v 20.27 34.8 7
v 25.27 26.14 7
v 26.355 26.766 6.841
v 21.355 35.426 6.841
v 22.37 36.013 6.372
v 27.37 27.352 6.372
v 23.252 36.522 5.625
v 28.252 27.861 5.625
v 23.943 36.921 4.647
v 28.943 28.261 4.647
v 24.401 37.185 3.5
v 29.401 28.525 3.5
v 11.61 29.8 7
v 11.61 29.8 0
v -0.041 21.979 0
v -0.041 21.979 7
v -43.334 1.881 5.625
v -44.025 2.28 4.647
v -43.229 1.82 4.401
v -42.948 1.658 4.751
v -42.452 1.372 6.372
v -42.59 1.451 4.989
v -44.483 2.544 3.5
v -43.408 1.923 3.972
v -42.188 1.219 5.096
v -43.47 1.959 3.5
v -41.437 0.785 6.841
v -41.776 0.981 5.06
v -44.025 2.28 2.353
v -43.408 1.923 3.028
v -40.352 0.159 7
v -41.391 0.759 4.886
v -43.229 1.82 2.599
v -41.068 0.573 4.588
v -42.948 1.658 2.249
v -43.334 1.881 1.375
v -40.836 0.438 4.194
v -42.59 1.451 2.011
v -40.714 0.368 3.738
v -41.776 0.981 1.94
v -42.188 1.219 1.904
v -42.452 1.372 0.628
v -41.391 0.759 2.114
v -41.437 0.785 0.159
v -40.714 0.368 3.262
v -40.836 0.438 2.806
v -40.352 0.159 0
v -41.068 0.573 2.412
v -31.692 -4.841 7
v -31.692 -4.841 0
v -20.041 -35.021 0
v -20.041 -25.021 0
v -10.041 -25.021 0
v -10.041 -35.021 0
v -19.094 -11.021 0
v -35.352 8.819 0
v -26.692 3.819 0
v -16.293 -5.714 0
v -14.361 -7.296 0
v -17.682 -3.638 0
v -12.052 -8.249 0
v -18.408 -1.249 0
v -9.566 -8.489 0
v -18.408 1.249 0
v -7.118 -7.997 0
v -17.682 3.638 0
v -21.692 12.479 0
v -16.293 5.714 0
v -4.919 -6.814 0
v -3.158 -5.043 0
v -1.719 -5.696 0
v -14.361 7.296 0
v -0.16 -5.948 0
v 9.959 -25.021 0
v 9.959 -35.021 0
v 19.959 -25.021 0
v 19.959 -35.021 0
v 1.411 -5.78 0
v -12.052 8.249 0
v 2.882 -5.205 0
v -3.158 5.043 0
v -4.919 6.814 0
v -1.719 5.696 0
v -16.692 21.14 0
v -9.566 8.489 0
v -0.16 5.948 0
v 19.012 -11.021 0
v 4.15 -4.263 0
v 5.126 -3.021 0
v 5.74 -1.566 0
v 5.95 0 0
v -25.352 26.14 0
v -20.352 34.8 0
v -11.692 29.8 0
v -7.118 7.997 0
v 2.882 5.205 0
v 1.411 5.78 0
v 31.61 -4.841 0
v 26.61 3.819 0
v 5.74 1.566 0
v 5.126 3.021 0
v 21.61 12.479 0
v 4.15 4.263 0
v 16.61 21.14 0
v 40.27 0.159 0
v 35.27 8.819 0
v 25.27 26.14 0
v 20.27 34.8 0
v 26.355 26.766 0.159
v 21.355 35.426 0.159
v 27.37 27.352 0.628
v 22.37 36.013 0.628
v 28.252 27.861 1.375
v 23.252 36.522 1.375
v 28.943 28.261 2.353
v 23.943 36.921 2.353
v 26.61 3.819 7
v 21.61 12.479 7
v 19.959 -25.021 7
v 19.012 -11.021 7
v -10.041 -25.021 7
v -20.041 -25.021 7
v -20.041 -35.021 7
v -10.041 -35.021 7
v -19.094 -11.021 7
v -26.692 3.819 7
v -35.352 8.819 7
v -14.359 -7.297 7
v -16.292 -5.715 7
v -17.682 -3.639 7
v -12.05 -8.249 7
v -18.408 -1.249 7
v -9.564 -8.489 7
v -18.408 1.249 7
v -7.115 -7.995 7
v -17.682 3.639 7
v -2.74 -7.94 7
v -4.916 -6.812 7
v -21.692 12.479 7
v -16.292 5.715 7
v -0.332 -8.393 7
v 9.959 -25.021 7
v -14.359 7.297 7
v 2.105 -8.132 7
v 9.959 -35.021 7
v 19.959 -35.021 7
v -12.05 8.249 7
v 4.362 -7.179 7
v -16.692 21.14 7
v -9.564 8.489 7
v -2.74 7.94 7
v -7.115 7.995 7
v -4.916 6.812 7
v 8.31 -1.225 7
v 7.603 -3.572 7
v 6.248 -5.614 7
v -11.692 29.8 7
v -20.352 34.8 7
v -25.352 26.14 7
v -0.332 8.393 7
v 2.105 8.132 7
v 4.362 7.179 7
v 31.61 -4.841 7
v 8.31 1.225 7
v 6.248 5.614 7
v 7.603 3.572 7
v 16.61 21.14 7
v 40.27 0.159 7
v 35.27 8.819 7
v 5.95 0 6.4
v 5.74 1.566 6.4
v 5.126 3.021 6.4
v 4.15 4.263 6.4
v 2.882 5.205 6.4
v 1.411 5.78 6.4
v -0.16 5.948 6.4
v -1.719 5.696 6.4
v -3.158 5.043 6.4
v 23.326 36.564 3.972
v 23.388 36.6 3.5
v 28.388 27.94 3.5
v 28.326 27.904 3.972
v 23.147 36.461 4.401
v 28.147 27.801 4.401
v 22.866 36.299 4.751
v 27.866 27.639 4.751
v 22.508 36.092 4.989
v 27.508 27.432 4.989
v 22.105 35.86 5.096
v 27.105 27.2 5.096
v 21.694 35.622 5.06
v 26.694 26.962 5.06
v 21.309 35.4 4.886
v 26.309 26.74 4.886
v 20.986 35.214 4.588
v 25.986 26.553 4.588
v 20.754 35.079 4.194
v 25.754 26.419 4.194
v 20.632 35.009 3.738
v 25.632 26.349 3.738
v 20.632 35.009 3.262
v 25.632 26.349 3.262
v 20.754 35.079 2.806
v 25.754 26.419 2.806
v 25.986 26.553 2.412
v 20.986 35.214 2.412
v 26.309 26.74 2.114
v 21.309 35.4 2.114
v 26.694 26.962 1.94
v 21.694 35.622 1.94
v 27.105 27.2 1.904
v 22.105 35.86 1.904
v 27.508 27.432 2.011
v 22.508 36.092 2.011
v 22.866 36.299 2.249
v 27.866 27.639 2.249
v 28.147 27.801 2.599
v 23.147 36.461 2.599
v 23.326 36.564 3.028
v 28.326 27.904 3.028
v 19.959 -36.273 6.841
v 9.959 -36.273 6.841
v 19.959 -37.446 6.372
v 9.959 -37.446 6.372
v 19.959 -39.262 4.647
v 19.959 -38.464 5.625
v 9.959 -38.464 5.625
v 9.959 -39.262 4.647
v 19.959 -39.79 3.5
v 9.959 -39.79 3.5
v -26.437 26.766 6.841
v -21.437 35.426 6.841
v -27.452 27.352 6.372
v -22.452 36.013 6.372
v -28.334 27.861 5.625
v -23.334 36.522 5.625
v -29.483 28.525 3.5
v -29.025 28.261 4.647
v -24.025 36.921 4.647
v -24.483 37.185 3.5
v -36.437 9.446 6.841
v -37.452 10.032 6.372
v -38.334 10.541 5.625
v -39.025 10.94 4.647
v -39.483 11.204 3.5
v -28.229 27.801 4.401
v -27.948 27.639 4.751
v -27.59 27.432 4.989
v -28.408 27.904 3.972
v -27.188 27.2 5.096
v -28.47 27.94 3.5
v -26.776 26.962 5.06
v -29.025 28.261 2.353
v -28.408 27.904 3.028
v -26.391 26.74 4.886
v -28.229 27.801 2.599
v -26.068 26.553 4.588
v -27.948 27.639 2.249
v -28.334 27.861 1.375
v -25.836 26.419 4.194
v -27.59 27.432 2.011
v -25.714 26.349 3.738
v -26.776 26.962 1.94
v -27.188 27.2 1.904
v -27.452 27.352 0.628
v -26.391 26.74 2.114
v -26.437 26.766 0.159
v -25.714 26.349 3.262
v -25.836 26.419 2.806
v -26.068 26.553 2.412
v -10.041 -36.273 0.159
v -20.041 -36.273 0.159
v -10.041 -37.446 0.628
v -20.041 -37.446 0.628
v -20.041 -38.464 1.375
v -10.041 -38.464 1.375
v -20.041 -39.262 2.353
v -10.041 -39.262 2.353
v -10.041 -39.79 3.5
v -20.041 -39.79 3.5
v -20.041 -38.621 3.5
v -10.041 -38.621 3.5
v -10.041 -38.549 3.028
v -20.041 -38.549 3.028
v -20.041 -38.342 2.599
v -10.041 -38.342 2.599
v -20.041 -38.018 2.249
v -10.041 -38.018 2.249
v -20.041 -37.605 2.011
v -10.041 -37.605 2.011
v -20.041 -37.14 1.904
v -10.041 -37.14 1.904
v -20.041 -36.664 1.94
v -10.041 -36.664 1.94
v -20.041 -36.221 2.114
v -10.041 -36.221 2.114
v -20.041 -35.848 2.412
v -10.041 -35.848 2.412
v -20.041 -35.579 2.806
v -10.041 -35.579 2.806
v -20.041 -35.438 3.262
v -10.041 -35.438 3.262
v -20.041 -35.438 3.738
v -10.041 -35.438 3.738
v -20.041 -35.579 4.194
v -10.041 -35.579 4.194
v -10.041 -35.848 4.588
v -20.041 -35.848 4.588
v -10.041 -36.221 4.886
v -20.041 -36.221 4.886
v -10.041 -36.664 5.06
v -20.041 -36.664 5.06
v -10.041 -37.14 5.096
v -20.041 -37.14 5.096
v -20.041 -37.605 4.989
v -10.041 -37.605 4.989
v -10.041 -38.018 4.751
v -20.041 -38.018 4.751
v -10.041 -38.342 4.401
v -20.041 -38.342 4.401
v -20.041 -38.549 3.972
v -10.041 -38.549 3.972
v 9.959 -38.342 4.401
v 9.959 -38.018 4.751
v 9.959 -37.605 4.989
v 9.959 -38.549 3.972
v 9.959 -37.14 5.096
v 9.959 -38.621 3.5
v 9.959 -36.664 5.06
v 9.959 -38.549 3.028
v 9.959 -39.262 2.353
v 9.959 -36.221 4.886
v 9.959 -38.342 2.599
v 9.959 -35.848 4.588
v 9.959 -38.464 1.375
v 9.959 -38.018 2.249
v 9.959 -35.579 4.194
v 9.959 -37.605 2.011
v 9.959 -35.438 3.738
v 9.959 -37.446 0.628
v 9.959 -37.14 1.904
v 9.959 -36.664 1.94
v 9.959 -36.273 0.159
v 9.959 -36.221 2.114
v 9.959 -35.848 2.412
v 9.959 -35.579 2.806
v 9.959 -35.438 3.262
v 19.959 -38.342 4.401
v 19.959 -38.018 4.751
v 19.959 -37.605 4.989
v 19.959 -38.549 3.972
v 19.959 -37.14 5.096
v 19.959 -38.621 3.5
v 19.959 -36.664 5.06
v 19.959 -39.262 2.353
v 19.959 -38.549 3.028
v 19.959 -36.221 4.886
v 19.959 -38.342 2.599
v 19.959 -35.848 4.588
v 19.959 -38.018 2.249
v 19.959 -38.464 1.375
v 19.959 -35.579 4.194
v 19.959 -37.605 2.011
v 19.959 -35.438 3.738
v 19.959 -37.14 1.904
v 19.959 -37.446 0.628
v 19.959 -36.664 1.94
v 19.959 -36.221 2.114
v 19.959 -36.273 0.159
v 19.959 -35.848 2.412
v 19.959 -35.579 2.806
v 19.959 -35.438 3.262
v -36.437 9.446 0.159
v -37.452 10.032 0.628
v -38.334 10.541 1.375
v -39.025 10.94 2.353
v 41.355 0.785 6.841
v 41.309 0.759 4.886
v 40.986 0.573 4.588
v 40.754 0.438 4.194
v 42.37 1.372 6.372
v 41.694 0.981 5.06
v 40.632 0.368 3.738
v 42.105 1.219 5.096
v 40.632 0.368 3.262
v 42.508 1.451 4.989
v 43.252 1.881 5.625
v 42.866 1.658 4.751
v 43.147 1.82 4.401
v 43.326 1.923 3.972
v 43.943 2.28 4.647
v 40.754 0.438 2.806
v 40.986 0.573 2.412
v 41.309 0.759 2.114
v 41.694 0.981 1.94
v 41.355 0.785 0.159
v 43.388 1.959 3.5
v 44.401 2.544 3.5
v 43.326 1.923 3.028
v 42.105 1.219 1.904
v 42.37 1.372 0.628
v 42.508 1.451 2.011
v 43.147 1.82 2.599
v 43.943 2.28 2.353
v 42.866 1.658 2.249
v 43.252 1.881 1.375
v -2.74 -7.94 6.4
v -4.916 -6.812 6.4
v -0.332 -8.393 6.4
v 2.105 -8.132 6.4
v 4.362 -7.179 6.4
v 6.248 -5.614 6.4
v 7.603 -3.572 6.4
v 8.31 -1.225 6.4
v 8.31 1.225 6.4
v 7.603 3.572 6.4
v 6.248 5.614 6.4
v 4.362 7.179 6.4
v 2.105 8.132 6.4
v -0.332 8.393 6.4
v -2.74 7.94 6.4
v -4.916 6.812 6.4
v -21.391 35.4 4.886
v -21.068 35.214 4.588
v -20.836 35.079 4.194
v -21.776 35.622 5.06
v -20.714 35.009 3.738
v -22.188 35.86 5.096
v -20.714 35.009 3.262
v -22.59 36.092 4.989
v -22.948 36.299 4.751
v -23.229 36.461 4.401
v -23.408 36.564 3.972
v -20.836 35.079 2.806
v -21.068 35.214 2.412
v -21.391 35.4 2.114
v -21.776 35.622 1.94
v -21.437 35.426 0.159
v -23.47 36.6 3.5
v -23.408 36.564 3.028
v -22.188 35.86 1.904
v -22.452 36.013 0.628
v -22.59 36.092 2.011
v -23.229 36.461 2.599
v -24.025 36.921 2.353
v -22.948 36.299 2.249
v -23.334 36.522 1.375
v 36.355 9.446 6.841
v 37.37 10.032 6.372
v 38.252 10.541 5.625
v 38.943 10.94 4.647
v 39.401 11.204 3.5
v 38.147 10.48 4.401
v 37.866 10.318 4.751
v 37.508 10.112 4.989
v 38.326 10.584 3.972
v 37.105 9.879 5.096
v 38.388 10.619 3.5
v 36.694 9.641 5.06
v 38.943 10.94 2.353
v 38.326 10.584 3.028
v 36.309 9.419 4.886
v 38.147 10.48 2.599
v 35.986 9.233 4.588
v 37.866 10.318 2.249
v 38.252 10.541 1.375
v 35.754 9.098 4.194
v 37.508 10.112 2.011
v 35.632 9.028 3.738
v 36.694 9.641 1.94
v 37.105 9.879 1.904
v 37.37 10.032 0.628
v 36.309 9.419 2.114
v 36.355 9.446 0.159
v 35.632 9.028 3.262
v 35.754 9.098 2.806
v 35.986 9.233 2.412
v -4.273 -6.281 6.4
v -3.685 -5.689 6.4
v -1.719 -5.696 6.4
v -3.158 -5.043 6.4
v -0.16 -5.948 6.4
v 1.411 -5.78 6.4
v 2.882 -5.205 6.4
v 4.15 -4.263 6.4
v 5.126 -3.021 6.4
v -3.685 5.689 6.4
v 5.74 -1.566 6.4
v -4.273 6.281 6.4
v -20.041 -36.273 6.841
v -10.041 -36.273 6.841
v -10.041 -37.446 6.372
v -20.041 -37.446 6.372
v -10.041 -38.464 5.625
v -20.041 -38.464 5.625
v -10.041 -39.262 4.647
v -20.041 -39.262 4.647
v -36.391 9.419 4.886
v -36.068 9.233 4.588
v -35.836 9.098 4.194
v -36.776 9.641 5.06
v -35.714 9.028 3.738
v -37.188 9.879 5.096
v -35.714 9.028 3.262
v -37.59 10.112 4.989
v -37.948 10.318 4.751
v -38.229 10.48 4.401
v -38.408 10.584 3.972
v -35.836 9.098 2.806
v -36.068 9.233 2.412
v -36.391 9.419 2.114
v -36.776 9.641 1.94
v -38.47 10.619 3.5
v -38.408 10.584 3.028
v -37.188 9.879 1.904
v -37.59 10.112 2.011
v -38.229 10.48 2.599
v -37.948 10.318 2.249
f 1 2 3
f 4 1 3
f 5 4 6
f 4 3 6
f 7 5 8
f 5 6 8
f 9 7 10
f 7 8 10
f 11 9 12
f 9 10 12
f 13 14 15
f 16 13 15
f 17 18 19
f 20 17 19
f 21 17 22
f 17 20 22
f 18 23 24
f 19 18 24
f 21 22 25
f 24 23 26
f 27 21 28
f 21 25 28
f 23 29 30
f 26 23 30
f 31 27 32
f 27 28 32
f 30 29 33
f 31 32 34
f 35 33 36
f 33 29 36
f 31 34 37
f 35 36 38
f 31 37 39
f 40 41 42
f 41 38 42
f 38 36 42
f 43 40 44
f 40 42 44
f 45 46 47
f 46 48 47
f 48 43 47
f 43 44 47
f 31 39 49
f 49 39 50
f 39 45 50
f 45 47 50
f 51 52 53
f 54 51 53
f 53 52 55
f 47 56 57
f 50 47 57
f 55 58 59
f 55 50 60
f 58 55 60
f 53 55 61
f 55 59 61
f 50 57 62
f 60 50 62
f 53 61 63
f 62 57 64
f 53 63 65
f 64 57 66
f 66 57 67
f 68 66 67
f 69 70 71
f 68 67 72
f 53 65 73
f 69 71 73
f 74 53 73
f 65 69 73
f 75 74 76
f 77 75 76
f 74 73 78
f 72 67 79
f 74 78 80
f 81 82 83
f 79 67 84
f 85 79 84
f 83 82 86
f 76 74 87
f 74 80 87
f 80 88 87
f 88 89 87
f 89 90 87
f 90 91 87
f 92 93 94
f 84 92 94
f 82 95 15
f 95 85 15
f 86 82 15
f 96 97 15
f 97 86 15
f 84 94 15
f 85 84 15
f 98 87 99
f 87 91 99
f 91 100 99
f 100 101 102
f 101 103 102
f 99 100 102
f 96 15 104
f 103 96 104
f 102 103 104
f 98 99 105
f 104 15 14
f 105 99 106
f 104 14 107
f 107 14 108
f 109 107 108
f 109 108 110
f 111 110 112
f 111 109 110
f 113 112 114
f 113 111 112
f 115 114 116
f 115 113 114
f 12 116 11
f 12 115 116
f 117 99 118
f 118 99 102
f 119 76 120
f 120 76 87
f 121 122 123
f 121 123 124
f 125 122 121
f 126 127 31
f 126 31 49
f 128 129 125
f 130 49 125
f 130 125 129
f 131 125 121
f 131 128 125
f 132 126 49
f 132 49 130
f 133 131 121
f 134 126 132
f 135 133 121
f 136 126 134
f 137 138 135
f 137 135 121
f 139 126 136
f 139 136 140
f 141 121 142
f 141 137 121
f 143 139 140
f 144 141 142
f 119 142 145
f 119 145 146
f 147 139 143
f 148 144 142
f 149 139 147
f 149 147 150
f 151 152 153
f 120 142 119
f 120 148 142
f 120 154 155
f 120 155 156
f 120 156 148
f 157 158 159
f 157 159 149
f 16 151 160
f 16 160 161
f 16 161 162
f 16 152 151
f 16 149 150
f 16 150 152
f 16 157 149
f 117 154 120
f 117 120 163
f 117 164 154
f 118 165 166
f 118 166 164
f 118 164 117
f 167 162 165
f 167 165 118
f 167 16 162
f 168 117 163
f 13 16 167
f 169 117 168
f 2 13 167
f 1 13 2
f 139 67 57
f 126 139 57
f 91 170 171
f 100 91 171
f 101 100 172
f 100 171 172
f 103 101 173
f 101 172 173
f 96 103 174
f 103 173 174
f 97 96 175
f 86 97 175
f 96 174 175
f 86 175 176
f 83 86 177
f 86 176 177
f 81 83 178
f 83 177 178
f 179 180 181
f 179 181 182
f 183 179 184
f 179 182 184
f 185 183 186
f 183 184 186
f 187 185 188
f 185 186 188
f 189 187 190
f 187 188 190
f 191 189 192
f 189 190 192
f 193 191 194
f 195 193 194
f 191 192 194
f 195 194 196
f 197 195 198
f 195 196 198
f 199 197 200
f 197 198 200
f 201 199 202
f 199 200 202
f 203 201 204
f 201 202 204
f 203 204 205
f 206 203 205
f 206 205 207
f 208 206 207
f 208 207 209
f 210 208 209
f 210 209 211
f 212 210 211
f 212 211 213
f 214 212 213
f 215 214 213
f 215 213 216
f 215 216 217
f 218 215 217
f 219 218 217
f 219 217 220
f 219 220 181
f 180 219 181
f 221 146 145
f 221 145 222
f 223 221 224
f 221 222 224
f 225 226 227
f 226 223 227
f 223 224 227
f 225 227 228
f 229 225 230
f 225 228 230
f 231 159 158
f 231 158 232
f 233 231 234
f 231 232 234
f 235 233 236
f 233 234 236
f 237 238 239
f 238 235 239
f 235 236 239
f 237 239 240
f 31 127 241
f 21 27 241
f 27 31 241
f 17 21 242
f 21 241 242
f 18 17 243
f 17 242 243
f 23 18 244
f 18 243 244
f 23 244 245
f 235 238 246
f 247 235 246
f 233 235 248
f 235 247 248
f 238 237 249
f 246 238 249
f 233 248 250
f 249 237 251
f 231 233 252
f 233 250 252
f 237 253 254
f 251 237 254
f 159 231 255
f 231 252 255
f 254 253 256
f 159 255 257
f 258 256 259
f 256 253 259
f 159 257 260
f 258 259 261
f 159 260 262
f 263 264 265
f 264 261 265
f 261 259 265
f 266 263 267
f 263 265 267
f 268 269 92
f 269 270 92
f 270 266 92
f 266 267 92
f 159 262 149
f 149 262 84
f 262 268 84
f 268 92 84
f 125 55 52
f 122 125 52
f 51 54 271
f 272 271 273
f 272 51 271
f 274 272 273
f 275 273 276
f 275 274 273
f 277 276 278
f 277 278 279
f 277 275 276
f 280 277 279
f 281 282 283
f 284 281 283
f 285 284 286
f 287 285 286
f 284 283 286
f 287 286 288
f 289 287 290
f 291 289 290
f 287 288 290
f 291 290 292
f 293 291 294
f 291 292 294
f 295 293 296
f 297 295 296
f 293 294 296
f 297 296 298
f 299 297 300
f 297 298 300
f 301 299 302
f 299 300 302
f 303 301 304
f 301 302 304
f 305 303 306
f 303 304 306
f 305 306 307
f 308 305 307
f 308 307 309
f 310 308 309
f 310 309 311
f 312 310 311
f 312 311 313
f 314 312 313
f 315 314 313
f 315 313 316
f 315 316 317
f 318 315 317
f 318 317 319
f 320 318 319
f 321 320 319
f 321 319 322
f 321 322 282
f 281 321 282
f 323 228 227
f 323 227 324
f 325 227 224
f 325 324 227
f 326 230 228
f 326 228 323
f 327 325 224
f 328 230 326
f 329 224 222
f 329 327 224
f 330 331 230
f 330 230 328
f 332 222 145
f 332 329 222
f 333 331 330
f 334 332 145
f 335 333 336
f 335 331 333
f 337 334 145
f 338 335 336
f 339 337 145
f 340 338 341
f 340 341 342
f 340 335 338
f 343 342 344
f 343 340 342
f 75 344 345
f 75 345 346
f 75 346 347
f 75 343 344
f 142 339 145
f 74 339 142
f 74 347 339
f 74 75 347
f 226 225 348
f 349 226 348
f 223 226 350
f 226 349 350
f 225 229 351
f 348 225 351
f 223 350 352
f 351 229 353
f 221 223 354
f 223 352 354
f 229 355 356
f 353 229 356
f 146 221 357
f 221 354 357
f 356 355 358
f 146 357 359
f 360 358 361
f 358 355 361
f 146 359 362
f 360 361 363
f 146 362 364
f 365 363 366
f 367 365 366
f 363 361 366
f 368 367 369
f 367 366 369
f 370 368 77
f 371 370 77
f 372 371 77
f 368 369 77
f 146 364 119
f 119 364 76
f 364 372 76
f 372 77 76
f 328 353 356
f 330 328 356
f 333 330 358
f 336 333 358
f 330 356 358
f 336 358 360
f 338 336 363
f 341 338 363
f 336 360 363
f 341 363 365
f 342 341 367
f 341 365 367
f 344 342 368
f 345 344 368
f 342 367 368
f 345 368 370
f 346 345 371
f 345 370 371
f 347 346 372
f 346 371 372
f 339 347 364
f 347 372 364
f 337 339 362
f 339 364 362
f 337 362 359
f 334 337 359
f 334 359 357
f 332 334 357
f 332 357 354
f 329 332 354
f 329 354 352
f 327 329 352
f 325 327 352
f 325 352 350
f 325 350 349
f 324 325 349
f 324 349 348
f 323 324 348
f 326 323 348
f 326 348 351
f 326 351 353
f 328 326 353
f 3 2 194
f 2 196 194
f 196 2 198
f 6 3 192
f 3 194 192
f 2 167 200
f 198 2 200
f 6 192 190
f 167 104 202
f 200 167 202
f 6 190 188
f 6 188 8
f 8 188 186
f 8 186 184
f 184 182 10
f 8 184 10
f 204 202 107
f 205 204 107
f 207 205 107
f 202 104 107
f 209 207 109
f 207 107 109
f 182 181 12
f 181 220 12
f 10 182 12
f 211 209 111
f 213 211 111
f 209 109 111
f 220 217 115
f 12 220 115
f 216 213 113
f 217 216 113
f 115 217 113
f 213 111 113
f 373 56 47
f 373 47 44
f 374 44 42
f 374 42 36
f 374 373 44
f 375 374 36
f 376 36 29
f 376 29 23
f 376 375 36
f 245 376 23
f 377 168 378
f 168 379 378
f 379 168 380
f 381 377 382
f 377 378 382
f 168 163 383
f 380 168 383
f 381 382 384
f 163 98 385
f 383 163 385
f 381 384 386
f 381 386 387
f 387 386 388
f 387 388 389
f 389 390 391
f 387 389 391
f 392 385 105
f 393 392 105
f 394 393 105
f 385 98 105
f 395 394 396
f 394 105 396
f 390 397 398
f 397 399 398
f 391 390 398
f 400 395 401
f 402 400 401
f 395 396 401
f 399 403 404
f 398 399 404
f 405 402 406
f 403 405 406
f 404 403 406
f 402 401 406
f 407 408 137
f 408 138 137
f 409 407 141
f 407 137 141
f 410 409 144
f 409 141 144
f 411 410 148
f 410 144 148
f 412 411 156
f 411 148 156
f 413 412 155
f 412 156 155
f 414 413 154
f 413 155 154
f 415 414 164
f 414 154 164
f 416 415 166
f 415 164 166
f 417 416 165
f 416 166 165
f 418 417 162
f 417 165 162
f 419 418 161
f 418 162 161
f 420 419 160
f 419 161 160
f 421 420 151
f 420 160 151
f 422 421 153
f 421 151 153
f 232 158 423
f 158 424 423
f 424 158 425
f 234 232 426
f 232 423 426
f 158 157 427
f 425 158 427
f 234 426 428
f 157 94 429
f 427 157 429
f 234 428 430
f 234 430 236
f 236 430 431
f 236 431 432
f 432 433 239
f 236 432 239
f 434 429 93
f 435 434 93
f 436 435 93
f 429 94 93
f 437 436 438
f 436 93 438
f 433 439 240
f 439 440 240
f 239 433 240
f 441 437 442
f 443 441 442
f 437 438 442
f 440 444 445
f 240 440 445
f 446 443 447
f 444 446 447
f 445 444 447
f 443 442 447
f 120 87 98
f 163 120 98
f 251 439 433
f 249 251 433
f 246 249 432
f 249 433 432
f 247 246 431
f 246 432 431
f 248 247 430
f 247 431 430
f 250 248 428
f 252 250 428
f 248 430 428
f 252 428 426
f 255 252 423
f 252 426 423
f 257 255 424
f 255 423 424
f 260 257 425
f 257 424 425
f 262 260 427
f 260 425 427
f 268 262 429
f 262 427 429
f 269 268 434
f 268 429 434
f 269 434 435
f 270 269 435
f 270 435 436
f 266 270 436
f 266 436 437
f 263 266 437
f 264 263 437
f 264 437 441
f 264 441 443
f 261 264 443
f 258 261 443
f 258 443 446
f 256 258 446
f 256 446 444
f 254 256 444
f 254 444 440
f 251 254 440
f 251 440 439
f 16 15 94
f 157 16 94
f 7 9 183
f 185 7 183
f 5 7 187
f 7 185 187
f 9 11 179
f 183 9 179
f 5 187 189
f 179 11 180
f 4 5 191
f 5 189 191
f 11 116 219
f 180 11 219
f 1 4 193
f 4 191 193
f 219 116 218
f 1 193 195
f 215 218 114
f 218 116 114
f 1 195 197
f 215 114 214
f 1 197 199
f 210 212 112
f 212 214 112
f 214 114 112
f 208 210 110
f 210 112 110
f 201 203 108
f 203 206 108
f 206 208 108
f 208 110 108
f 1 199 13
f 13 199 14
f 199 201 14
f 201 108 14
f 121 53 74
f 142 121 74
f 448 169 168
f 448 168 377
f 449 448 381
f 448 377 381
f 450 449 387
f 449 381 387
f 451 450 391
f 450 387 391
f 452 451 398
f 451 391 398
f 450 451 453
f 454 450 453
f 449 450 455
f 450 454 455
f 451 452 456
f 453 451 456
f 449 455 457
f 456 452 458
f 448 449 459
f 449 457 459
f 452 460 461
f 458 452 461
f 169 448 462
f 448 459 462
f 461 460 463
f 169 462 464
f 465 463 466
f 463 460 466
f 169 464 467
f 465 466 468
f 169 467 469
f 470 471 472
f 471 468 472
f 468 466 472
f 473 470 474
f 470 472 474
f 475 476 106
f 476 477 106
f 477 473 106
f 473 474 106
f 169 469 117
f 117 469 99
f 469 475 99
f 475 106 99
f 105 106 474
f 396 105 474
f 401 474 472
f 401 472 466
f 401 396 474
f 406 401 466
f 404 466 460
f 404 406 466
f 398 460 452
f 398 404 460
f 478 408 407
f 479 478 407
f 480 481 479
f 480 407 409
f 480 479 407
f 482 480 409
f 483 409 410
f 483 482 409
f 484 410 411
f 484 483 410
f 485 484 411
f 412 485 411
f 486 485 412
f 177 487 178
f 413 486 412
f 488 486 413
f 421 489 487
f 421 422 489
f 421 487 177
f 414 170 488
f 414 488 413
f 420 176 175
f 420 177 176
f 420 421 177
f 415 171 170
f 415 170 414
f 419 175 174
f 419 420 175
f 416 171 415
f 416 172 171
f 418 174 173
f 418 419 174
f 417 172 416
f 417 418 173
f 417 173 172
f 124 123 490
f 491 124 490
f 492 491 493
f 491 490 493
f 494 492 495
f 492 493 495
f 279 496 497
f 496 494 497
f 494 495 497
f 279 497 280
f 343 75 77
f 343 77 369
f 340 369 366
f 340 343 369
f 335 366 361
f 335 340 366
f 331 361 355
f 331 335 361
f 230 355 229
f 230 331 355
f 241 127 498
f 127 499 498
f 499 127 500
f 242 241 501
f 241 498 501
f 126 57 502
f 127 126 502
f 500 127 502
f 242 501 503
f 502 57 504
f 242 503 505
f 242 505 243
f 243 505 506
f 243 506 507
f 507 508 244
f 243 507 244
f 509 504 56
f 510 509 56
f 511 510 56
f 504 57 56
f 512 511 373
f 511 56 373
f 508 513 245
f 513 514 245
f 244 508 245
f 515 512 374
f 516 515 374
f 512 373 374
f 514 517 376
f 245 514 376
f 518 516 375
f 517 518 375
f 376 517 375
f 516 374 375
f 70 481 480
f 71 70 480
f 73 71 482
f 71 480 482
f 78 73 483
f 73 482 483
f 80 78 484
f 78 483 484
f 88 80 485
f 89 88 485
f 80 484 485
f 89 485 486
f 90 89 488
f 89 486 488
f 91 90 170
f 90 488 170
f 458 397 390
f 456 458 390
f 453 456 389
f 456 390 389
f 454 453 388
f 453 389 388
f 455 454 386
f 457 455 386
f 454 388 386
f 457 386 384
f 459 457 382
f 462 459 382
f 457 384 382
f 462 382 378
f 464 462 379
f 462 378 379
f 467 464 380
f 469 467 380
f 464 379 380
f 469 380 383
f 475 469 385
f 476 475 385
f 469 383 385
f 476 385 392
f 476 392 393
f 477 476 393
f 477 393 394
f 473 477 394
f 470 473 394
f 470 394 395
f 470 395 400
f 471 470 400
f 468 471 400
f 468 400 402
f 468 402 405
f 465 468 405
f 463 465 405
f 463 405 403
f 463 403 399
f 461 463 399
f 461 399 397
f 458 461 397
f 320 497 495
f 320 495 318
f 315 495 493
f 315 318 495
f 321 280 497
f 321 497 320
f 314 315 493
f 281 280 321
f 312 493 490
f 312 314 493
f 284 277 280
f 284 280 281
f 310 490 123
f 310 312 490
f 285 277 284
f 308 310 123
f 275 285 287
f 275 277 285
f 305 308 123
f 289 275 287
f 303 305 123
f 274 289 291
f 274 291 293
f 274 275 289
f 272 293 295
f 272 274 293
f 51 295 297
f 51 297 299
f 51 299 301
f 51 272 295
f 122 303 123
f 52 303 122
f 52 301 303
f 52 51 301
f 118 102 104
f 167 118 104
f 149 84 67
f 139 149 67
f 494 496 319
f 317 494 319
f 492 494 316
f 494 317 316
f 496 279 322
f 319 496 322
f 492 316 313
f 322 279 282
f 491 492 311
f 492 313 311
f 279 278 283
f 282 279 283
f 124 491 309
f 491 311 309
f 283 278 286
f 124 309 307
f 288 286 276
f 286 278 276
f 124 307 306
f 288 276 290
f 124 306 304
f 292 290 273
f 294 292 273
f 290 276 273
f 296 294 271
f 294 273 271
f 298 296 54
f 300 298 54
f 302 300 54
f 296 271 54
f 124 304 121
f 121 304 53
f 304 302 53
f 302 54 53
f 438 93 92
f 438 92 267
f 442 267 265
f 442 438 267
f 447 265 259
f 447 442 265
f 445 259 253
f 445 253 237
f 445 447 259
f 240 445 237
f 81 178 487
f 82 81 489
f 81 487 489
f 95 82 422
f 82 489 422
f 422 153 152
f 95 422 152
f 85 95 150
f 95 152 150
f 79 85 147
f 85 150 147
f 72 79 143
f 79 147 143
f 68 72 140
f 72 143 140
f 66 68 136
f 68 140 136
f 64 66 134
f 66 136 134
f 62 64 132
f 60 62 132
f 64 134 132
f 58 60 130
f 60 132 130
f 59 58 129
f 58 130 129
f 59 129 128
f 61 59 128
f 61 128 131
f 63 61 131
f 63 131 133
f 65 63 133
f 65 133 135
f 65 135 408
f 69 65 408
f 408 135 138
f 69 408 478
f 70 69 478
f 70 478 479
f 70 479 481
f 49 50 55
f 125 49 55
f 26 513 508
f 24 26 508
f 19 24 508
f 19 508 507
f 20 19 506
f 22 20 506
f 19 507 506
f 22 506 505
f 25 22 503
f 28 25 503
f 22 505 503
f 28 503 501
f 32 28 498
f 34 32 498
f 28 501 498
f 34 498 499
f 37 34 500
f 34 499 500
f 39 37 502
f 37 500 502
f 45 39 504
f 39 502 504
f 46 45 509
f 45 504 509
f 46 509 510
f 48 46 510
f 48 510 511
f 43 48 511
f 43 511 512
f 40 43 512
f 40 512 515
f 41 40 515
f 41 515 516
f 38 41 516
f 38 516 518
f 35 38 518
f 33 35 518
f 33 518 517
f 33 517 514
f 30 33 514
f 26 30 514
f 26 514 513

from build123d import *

# Parameters (mm, degrees)
F0_W         = 10
F0_H         = 15
F1_DEPTH     = 7
F3_DEPTH     = 60
F4_R         = 1.6
F5_DEPTH     = 60
F6_R         = 1.6
F7_DEPTH     = 60
F8_T1_DEPTH  = 35
F8_T3_DEPTH  = 35
F8_T5_DEPTH  = 35
F8_T7_DEPTH  = 35
F8_T9_DEPTH  = 35
F8_T11_DEPTH = 35
F11_DEPTH    = 25
F12_R        = 8.4
F13_DEPTH    = 0.6


# Not quite as in the source:
# - a fillet or chamfer that OpenCascade refuses, or shapes differently, is made with other operations: its cross-section is extruded or revolved along the edge and cut away or added
# - a feature names something its author has since deleted; it is built from what else it names


with BuildPart() as f1:
    # F0 (on Top) → F1 (new body)
    with BuildSketch(Plane.XY):
        Polygon((-19.0935776077, -11.020506829), (-0.0410187244, -0.020506829), (-21.6916538191, 12.479493171), (-26.6916538191, 3.8192391331), (-31.6916538191, -4.8410149047), align=None)
        Polygon((-0.0410187244, 21.979493171), (-0.0410187244, -0.020506829), (21.6096163702, 12.479493171), (16.6096163702, 21.1397472088), (11.6096163702, 29.8000012467), align=None)
        Polygon((19.0115401588, -11.020506829), (-0.0410187244, -0.020506829), (-0.0410187244, -25.020506829), (9.9589812756, -25.020506829), (19.9589812756, -25.020506829), align=None)
        Polygon((-0.0410187244, -25.020506829), (-0.0410187244, -0.020506829), (-19.0935776077, -11.020506829), (-20.0410187244, -25.020506829), (-10.0410187244, -25.020506829), align=None)
        Polygon((-21.6916538191, 12.479493171), (-0.0410187244, -0.020506829), (-0.0410187244, 21.979493171), (-11.6916538191, 29.8000012467), (-16.6916538191, 21.1397472088), align=None)
        Polygon((21.6096163702, 12.479493171), (-0.0410187244, -0.020506829), (19.0115401588, -11.020506829), (31.6096163702, -4.8410149047), (26.6096163702, 3.8192391331), align=None)
        Polygon((-29.6820348758, 28.6397472088), (-16.6916538191, 21.1397472088), (-11.6916538191, 29.8000012467), (-24.6820348758, 37.3000012467), align=None)
        Polygon((-31.6916538191, -4.8410149047), (-26.6916538191, 3.8192391331), (-39.6820348758, 11.3192391331), (-44.6820348758, 2.6589850953), align=None)
        Polygon((39.5999974269, 11.3192391331), (26.6096163702, 3.8192391331), (31.6096163702, -4.8410149047), (44.5999974269, 2.6589850953), align=None)
        Polygon((11.6096163702, 29.8000012467), (16.6096163702, 21.1397472088), (29.5999974269, 28.6397472088), (24.5999974269, 37.3000012467), align=None)
        with Locations((-15.0410187244, -32.520506829)):
            Rectangle(F0_W, F0_H)
        with Locations((14.9589812756, -32.520506829)):
            Rectangle(F0_W, F0_H)
    extrude(amount=F1_DEPTH)

    # F2 (on face) → F3 (cut)
    with BuildSketch(Plane.YZ.offset(19.9589812756)):
        with BuildLine():
            ThreePointArc((-35.420506829, 3.5), (-37.020506829, 5.1), (-38.620506829, 3.5))
            ThreePointArc((-38.620506829, 3.5), (-37.020506829, 1.9), (-35.420506829, 3.5))
        make_face()
    extrude(amount=-F3_DEPTH, mode=Mode.SUBTRACT)

    # F4 (on face) → F5 (cut)
    with BuildSketch(Plane(origin=(9.9986250363, -17.3181265688, 0), x_dir=(0.8660254038, 0.5, 0), z_dir=(0.5, -0.8660254038, 0))):
        with Locations((36.9542233281, 3.5)):
            Circle(F4_R)
    extrude(amount=-F5_DEPTH, mode=Mode.SUBTRACT)

    # F6 (on face) → F7 (cut)
    with BuildSketch(Plane(origin=(9.9808656014, 17.2873663252, 0), x_dir=(-0.8660254038, 0.5, 0), z_dir=(0.5, 0.8660254038, 0))):
        with Locations((37.0252698429, 3.5)):
            Circle(F6_R)
    extrude(amount=-F7_DEPTH, mode=Mode.SUBTRACT)

    # F8: fillet of radius 5 on 12 edges, made by hand

    # F8_s2 → F8_t1 (cut)
    with BuildSketch(Plane.YZ.offset(-32.5410187244)):
        with BuildLine():
            ThreePointArc((-35.020506829, 7), (-38.556040735, 5.5355339059), (-40.020506829, 2))
            Line((-40.020506829, 2), (-40.020506829, 7))
            Line((-40.020506829, 7), (-35.020506829, 7))
        make_face()
        with BuildLine():
            ThreePointArc((-35.020506829, 0), (-38.556040735, 1.4644660941), (-40.020506829, 5))
            Line((-40.020506829, 5), (-40.020506829, 0))
            Line((-40.020506829, 0), (-35.020506829, 0))
        make_face()
    extrude(amount=F8_T1_DEPTH, mode=Mode.SUBTRACT)

    # F8_s4 → F8_t3 (cut)
    with BuildSketch(Plane.YZ.offset(-2.5410187244)):
        with BuildLine():
            ThreePointArc((-35.020506829, 0), (-38.556040735, 1.4644660941), (-40.020506829, 5))
            Line((-40.020506829, 5), (-40.020506829, 0))
            Line((-40.020506829, 0), (-35.020506829, 0))
        make_face()
        with BuildLine():
            ThreePointArc((-35.020506829, 7), (-38.556040735, 5.5355339059), (-40.020506829, 2))
            Line((-40.020506829, 2), (-40.020506829, 7))
            Line((-40.020506829, 7), (-35.020506829, 7))
        make_face()
    extrude(amount=F8_T3_DEPTH, mode=Mode.SUBTRACT)

    # F8_s6 → F8_t5 (cut)
    with BuildSketch(Plane(origin=(16.2486250363, -28.1434441161, 0), x_dir=(0, 0, 1), z_dir=(-0.5, 0.8660254038, 0))):
        with BuildLine():
            ThreePointArc((7, 34.9542233281), (5.5355339059, 38.489757234), (2, 39.9542233281))
            Line((2, 39.9542233281), (7, 39.9542233281))
            Line((7, 39.9542233281), (7, 34.9542233281))
        make_face()
        with BuildLine():
            ThreePointArc((0, 34.9542233281), (1.4644660941, 38.489757234), (5, 39.9542233281))
            Line((5, 39.9542233281), (0, 39.9542233281))
            Line((0, 39.9542233281), (0, 34.9542233281))
        make_face()
    extrude(amount=F8_T5_DEPTH, mode=Mode.SUBTRACT)

    # F8_s8 → F8_t7 (cut)
    with BuildSketch(Plane(origin=(1.2486250363, -2.1626820025, 0), x_dir=(0, 0, 1), z_dir=(-0.5, 0.8660254038, 0))):
        with BuildLine():
            ThreePointArc((7, 34.9542233281), (5.5355339059, 38.489757234), (2, 39.9542233281))
            Line((2, 39.9542233281), (7, 39.9542233281))
            Line((7, 39.9542233281), (7, 34.9542233281))
        make_face()
        with BuildLine():
            ThreePointArc((0, 34.9542233281), (1.4644660941, 38.489757234), (5, 39.9542233281))
            Line((5, 39.9542233281), (0, 39.9542233281))
            Line((0, 39.9542233281), (0, 34.9542233281))
        make_face()
    extrude(amount=F8_T7_DEPTH, mode=Mode.SUBTRACT)

    # F8_s10 → F8_t9 (cut)
    with BuildSketch(Plane(origin=(16.2308656014, 28.1126838725, 0), x_dir=(0, 0, 1), z_dir=(-0.5, -0.8660254038, 0))):
        with BuildLine():
            ThreePointArc((7, 35.0252698429), (5.5355339059, 38.5608037488), (2, 40.0252698429))
            Line((2, 40.0252698429), (7, 40.0252698429))
            Line((7, 40.0252698429), (7, 35.0252698429))
        make_face()
        with BuildLine():
            ThreePointArc((0, 35.0252698429), (1.4644660941, 38.5608037488), (5, 40.0252698429))
            Line((5, 40.0252698429), (0, 40.0252698429))
            Line((0, 40.0252698429), (0, 35.0252698429))
        make_face()
    extrude(amount=F8_T9_DEPTH, mode=Mode.SUBTRACT)

    # F8_s12 → F8_t11 (cut)
    with BuildSketch(Plane(origin=(1.2308656014, 2.131921759, 0), x_dir=(0, 0, 1), z_dir=(-0.5, -0.8660254038, 0))):
        with BuildLine():
            ThreePointArc((7, 35.0252698429), (5.5355339059, 38.5608037488), (2, 40.0252698429))
            Line((2, 40.0252698429), (7, 40.0252698429))
            Line((7, 40.0252698429), (7, 35.0252698429))
        make_face()
        with BuildLine():
            ThreePointArc((0, 35.0252698429), (1.4644660941, 38.5608037488), (5, 40.0252698429))
            Line((5, 40.0252698429), (0, 40.0252698429))
            Line((0, 40.0252698429), (0, 35.0252698429))
        make_face()
    extrude(amount=F8_T11_DEPTH, mode=Mode.SUBTRACT)

    # F10 (on face) → F11 (cut)
    with BuildSketch(Plane.XY.offset(7)):
        with BuildLine():
            ThreePointArc((-3.157625, -5.0430054887), (-1.9250328948, -2.6542242275), (-1.5, 0))
            Line((-1.5, 0), (-5.95, 0))
            ThreePointArc((-5.95, 0), (-5.2053034854, -2.8822414238), (-3.157625, -5.0430054887))
        make_face()
        with BuildLine():
            Line((-5.95, 0), (-1.5, 0))
            ThreePointArc((-1.5, 0), (-1.9250328948, 2.6542242275), (-3.157625, 5.0430054887))
            ThreePointArc((-3.157625, 5.0430054887), (-5.2053034854, 2.8822414238), (-5.95, 0))
        make_face()
        with BuildLine():
            ThreePointArc((-3.157625, 5.0430054887), (-1.9250328948, 2.6542242275), (-1.5, 0))
            ThreePointArc((-1.5, 0), (-1.9250328948, -2.6542242275), (-3.157625, -5.0430054887))
            ThreePointArc((-3.157625, -5.0430054887), (2.8822414238, -5.2053034854), (5.95, 0))
            ThreePointArc((5.95, 0), (2.8822414238, 5.2053034854), (-3.157625, 5.0430054887))
        make_face()
        with BuildLine():
            ThreePointArc((-3.157625, -5.0430054887), (-5.2053034854, -2.8822414238), (-5.95, 0))
            ThreePointArc((-5.95, 0), (-5.2053034854, 2.8822414238), (-3.157625, 5.0430054887))
            ThreePointArc((-3.157625, 5.0430054887), (-18.5, 0), (-3.157625, -5.0430054887))
        make_face()
    extrude(amount=-F11_DEPTH, mode=Mode.SUBTRACT)

    # F12 (on face) → F13 (cut)
    with BuildSketch(Plane.XY.offset(7)):
        Circle(F12_R)
    extrude(amount=-F13_DEPTH, mode=Mode.SUBTRACT)


solid = f1.part
